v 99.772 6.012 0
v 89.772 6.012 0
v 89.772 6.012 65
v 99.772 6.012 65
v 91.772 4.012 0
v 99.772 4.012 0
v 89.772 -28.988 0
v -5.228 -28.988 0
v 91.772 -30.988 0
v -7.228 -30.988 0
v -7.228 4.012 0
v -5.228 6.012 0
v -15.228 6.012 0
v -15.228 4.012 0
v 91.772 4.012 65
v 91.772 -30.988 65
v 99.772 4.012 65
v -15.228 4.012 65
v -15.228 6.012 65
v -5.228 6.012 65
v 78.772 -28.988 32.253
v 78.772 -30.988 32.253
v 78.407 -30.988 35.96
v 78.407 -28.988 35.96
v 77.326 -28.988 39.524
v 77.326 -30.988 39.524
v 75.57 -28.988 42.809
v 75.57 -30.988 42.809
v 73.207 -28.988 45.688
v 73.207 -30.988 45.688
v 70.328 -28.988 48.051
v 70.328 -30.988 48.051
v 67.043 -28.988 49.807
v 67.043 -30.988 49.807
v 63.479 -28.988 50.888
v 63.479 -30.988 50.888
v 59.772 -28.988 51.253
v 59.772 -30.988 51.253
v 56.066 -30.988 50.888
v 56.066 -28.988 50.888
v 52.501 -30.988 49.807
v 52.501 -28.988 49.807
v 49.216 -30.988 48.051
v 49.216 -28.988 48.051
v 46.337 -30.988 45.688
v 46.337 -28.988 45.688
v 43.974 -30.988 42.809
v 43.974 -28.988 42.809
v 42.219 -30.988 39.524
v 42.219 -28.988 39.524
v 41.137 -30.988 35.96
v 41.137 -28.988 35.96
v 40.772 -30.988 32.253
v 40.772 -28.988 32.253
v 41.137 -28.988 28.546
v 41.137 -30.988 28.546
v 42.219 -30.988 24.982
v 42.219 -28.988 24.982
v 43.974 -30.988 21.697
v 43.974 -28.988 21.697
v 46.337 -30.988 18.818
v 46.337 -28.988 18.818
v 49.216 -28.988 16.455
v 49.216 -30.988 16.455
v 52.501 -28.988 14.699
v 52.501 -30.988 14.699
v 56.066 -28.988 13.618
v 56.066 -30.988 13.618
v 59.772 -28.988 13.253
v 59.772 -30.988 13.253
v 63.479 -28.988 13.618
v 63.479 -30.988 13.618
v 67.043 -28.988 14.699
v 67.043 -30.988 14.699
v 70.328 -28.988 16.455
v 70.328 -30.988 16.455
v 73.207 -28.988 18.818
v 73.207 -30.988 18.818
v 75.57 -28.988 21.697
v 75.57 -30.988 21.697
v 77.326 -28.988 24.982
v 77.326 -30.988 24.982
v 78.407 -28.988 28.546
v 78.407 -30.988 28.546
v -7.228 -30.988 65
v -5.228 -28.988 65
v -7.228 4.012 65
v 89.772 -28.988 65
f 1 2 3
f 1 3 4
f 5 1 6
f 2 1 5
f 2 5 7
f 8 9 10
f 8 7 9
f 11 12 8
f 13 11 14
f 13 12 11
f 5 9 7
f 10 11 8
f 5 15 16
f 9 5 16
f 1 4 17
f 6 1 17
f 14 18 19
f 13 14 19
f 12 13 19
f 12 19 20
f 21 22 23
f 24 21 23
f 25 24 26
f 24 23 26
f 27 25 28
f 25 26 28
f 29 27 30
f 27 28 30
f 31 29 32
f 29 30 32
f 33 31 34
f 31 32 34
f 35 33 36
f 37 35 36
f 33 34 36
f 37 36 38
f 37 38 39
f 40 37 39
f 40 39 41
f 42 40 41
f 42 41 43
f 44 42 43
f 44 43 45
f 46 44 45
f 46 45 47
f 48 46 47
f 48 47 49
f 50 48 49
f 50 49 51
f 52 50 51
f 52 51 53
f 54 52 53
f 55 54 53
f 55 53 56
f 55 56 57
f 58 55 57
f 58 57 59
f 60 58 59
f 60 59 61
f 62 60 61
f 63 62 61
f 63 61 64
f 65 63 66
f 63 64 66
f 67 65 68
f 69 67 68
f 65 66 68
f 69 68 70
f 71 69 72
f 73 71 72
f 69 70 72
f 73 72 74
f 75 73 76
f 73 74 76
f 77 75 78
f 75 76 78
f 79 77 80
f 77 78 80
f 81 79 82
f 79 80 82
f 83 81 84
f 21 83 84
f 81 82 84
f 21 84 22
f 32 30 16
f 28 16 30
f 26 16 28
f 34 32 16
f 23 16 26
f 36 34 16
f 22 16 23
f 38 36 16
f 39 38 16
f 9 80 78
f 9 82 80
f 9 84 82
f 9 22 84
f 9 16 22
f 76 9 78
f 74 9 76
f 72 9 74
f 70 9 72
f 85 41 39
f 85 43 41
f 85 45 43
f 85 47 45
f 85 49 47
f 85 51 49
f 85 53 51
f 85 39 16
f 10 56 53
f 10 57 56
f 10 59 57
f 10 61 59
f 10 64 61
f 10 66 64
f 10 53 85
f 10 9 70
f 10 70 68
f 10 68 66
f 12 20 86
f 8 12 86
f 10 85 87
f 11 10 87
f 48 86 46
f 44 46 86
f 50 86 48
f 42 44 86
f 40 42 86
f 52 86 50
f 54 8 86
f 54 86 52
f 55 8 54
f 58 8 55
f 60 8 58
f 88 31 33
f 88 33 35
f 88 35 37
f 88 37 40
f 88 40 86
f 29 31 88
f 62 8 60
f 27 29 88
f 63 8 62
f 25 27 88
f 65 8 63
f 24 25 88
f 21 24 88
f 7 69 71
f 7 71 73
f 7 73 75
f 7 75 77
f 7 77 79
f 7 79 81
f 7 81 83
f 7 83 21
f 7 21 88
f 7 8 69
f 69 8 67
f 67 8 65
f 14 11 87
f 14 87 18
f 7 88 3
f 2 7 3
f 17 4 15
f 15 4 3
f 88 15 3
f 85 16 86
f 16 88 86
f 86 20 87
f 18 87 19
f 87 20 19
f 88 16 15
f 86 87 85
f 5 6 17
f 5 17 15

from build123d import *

# Parameters (mm, degrees)
BOSS_EXTRUDE1_DEPTH = 65
SKETCH2_R           = 19
CUT_EXTRUDE1_DEPTH  = 125.693619771


with BuildPart() as part:
    # Sketch1 → Boss-Extrude1 (new body)
    with BuildSketch(Plane.XY):
        Polygon((-15.227765327, 6.012341763), (-5.227765327, 6.012341763), (-5.227765327, -28.987658237), (89.772234673, -28.987658237), (89.772234673, 6.012341763), (99.772234673, 6.012341763), (99.772234673, 4.012341763), (91.772234673, 4.012341763), (91.772234673, -30.987658237), (-7.227765327, -30.987658237), (-7.227765327, 4.012341763), (-15.227765327, 4.012341763), align=None)
    extrude(amount=BOSS_EXTRUDE1_DEPTH)

    # Sketch2 → Cut-Extrude1 (cut, through all)
    with BuildSketch(Plane.XZ.offset(30.987658237)):
        with Locations((59.772234673, 32.253053016)):
            Circle(SKETCH2_R)
    extrude(amount=-CUT_EXTRUDE1_DEPTH, mode=Mode.SUBTRACT)


solid = part.part
